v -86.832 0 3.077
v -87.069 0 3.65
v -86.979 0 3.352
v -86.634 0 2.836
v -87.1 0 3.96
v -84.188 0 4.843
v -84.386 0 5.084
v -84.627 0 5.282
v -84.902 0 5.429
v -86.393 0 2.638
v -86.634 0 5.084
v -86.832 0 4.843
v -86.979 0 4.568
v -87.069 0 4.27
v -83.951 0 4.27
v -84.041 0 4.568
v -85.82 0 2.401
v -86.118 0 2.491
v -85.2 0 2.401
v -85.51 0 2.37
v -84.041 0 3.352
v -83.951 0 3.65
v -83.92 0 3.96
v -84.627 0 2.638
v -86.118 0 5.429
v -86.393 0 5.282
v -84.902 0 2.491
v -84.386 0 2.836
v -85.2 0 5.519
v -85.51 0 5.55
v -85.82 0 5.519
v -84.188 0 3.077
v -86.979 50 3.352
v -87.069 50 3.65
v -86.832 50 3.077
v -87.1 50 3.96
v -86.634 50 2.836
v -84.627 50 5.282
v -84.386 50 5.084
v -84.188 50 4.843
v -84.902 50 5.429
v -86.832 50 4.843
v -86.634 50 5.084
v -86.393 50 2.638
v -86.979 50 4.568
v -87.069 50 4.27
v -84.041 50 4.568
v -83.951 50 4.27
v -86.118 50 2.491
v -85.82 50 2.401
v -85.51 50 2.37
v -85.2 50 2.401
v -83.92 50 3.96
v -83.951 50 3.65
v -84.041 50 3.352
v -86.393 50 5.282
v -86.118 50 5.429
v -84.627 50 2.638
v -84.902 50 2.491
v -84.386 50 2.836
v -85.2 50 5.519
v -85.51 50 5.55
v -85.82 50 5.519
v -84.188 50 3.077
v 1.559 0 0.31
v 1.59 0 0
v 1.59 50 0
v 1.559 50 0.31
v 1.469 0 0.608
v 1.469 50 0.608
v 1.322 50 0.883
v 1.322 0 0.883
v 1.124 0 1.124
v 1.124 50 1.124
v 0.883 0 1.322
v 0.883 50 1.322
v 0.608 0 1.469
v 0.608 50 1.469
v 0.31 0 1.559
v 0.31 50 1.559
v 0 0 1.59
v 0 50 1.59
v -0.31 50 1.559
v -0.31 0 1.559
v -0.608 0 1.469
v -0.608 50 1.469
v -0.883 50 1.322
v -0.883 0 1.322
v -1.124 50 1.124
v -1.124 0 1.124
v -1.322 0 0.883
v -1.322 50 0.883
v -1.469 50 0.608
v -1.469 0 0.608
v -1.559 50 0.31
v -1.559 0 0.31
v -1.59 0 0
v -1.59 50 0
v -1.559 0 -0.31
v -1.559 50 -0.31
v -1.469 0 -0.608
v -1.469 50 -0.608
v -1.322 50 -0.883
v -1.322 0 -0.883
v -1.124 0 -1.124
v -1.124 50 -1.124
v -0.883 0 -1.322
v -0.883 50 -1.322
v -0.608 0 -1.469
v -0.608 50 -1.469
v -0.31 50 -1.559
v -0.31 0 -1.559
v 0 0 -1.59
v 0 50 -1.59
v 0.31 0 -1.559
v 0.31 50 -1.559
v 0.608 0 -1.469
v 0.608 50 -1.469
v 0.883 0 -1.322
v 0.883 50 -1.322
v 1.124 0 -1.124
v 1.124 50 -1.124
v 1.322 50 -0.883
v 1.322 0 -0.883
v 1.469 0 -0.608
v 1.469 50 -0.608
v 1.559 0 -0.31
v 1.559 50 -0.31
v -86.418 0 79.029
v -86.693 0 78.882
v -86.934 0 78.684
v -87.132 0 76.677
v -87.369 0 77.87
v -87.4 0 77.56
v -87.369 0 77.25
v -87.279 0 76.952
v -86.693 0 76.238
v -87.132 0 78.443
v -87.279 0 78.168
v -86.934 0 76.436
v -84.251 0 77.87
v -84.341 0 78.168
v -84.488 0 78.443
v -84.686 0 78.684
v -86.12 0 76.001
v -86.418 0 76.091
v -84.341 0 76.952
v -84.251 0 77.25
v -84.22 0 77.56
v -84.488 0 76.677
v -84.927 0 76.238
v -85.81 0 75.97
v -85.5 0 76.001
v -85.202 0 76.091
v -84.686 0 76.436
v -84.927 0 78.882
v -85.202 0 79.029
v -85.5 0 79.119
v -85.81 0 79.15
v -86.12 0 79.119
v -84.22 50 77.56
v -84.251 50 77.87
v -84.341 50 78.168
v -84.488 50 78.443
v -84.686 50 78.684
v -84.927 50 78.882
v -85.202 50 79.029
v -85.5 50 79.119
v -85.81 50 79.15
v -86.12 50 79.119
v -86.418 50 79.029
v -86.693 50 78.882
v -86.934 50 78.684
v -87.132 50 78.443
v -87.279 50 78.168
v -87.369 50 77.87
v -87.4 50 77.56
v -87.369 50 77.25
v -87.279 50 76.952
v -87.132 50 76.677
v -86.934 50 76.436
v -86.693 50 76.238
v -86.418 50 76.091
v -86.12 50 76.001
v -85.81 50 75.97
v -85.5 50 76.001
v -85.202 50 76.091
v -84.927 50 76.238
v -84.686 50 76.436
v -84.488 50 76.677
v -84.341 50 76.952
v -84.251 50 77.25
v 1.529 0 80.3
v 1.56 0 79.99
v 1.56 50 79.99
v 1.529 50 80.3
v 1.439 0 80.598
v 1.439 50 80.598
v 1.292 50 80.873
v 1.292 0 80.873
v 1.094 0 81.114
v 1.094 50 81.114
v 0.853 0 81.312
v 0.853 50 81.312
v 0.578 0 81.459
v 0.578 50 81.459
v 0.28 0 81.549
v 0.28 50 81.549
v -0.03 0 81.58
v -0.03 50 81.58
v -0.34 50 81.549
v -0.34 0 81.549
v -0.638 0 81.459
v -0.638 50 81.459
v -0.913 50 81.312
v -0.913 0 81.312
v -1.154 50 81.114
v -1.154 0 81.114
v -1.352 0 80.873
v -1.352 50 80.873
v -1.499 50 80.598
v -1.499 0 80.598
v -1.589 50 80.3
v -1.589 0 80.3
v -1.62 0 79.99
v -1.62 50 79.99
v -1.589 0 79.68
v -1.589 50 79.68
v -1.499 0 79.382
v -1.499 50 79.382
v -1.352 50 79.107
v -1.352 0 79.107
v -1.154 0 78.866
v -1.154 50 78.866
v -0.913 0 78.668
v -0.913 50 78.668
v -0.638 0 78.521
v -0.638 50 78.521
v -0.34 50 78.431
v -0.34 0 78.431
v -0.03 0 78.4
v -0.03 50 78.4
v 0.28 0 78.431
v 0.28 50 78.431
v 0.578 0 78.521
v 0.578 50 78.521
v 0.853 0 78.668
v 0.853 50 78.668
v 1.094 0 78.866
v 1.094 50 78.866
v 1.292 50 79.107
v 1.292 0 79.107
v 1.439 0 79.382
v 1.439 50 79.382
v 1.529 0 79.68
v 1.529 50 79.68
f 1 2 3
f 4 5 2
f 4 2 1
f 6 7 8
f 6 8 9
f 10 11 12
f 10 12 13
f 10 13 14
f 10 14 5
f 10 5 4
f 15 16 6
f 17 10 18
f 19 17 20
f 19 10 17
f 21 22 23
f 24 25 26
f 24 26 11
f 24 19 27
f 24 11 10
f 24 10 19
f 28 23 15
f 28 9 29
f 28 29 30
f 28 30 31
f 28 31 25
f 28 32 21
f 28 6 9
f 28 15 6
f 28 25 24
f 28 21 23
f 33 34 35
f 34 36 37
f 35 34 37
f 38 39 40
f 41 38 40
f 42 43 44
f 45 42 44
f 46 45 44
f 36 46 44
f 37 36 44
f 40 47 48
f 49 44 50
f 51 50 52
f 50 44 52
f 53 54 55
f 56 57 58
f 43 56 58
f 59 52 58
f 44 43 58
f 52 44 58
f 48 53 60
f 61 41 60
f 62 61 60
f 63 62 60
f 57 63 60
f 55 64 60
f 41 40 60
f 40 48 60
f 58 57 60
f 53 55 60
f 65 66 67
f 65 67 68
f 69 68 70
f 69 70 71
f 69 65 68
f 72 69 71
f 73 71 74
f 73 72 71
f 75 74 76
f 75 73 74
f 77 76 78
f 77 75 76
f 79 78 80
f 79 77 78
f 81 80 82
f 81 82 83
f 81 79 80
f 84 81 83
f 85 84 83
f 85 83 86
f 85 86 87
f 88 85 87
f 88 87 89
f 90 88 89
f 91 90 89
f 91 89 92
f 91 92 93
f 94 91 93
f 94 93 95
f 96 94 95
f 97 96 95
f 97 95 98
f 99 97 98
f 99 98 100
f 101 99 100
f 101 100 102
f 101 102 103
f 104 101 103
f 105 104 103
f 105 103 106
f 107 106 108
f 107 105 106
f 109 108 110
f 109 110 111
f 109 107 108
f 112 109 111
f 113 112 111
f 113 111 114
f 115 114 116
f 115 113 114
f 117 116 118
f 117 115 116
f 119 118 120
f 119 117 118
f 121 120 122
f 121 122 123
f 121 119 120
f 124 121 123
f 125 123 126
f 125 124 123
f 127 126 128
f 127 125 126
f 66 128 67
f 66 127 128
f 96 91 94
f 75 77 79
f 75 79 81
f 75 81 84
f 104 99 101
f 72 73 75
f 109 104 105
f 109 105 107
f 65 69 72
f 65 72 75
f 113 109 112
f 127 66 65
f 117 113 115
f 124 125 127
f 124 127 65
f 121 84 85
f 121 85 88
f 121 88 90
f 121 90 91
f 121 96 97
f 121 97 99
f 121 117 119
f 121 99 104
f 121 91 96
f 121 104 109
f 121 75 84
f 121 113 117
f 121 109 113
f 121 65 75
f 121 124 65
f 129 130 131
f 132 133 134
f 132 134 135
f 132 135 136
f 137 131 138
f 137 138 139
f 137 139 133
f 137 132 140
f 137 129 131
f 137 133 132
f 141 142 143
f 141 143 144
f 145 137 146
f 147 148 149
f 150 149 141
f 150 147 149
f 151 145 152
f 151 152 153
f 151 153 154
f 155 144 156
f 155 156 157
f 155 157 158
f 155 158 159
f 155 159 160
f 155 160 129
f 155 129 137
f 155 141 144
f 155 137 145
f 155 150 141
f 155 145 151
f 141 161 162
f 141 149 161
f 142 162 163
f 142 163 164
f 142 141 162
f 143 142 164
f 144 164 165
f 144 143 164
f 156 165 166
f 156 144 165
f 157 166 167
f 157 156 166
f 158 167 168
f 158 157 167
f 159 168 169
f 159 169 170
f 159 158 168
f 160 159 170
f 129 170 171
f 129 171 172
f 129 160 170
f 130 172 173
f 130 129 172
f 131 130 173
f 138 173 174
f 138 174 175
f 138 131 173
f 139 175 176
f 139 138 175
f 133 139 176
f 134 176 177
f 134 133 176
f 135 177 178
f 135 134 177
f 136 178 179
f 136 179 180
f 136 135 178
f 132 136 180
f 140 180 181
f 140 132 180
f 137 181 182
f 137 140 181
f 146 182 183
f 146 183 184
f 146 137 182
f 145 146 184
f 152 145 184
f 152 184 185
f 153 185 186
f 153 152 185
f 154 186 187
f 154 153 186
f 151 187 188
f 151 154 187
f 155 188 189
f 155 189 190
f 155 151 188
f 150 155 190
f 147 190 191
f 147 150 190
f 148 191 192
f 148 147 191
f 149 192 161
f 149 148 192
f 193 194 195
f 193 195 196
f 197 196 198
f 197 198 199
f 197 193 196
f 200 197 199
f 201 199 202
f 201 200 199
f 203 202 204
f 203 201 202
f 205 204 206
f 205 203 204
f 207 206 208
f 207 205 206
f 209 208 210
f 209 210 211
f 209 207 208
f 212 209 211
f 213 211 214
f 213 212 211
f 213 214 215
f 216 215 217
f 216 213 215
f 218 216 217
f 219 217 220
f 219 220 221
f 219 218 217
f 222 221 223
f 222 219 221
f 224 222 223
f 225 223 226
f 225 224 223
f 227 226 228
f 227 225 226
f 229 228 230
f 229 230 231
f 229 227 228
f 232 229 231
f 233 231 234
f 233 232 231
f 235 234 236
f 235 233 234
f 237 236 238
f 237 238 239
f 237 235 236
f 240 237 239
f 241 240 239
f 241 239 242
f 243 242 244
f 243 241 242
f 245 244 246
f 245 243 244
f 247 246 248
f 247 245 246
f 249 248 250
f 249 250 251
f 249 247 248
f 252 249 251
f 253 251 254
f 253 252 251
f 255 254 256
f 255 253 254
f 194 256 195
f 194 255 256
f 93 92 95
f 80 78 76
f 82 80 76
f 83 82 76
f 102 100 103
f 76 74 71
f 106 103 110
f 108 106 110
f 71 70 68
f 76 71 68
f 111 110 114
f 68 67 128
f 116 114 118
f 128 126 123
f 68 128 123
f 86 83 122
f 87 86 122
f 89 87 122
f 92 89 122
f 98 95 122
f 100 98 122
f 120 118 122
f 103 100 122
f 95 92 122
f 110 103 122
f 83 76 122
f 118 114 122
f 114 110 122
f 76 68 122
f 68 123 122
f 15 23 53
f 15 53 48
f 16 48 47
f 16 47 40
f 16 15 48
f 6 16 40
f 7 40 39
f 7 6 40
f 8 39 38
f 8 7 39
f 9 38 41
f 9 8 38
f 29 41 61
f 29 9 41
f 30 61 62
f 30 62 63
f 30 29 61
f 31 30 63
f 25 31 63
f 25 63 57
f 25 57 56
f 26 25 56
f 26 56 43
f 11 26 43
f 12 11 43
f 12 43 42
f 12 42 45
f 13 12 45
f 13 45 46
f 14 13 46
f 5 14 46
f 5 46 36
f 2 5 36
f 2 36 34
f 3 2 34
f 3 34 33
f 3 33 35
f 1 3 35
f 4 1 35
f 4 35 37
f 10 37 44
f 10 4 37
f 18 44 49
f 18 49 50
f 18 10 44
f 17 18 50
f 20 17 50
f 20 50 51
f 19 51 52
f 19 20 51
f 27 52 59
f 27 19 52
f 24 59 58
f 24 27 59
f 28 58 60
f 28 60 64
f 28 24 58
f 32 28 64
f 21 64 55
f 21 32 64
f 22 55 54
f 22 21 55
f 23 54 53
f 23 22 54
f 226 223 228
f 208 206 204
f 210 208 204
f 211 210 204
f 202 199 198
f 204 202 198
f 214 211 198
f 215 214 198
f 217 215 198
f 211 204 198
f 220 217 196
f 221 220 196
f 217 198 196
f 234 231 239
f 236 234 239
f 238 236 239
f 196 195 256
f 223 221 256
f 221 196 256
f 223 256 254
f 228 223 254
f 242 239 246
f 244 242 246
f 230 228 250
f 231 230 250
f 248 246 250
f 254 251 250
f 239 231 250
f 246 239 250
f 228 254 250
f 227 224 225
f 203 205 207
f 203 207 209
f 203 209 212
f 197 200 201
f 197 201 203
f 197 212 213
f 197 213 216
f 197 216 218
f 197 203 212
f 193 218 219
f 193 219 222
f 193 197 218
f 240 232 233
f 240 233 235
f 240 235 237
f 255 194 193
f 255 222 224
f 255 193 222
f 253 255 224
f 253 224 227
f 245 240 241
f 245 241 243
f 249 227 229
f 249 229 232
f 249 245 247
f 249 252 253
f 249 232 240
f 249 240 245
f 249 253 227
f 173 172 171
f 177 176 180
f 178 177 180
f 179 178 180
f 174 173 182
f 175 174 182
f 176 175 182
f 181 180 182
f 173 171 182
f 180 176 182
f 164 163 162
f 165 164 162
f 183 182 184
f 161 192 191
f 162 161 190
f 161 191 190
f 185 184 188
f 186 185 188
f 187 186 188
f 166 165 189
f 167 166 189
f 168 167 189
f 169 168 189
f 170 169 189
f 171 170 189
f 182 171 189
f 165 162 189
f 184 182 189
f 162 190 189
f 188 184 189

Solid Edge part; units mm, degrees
sketch "Sketch1" plane through (0, 0, 0) normal (0, -1, 0) x (1, 0, 0)
  circle A0 centre (0, 0) radius 1.59
  circle A1 centre (-85.81, 77.56) radius 1.59
  circle A2 centre (-0.03, 79.99) radius 1.59
  circle A3 centre (-85.51, 3.96) radius 1.59
  dimension "D1" = 85.51
  dimension "D2" = 3.96
  dimension "D3" = 79.99
  dimension "D4" = 0.03
  dimension "D5" = 85.78
  dimension "D6" = 73.6
extrude "Protrusion1" add sketch "Sketch1" against normal blind 50
properties material "Aluminum, 1350"
